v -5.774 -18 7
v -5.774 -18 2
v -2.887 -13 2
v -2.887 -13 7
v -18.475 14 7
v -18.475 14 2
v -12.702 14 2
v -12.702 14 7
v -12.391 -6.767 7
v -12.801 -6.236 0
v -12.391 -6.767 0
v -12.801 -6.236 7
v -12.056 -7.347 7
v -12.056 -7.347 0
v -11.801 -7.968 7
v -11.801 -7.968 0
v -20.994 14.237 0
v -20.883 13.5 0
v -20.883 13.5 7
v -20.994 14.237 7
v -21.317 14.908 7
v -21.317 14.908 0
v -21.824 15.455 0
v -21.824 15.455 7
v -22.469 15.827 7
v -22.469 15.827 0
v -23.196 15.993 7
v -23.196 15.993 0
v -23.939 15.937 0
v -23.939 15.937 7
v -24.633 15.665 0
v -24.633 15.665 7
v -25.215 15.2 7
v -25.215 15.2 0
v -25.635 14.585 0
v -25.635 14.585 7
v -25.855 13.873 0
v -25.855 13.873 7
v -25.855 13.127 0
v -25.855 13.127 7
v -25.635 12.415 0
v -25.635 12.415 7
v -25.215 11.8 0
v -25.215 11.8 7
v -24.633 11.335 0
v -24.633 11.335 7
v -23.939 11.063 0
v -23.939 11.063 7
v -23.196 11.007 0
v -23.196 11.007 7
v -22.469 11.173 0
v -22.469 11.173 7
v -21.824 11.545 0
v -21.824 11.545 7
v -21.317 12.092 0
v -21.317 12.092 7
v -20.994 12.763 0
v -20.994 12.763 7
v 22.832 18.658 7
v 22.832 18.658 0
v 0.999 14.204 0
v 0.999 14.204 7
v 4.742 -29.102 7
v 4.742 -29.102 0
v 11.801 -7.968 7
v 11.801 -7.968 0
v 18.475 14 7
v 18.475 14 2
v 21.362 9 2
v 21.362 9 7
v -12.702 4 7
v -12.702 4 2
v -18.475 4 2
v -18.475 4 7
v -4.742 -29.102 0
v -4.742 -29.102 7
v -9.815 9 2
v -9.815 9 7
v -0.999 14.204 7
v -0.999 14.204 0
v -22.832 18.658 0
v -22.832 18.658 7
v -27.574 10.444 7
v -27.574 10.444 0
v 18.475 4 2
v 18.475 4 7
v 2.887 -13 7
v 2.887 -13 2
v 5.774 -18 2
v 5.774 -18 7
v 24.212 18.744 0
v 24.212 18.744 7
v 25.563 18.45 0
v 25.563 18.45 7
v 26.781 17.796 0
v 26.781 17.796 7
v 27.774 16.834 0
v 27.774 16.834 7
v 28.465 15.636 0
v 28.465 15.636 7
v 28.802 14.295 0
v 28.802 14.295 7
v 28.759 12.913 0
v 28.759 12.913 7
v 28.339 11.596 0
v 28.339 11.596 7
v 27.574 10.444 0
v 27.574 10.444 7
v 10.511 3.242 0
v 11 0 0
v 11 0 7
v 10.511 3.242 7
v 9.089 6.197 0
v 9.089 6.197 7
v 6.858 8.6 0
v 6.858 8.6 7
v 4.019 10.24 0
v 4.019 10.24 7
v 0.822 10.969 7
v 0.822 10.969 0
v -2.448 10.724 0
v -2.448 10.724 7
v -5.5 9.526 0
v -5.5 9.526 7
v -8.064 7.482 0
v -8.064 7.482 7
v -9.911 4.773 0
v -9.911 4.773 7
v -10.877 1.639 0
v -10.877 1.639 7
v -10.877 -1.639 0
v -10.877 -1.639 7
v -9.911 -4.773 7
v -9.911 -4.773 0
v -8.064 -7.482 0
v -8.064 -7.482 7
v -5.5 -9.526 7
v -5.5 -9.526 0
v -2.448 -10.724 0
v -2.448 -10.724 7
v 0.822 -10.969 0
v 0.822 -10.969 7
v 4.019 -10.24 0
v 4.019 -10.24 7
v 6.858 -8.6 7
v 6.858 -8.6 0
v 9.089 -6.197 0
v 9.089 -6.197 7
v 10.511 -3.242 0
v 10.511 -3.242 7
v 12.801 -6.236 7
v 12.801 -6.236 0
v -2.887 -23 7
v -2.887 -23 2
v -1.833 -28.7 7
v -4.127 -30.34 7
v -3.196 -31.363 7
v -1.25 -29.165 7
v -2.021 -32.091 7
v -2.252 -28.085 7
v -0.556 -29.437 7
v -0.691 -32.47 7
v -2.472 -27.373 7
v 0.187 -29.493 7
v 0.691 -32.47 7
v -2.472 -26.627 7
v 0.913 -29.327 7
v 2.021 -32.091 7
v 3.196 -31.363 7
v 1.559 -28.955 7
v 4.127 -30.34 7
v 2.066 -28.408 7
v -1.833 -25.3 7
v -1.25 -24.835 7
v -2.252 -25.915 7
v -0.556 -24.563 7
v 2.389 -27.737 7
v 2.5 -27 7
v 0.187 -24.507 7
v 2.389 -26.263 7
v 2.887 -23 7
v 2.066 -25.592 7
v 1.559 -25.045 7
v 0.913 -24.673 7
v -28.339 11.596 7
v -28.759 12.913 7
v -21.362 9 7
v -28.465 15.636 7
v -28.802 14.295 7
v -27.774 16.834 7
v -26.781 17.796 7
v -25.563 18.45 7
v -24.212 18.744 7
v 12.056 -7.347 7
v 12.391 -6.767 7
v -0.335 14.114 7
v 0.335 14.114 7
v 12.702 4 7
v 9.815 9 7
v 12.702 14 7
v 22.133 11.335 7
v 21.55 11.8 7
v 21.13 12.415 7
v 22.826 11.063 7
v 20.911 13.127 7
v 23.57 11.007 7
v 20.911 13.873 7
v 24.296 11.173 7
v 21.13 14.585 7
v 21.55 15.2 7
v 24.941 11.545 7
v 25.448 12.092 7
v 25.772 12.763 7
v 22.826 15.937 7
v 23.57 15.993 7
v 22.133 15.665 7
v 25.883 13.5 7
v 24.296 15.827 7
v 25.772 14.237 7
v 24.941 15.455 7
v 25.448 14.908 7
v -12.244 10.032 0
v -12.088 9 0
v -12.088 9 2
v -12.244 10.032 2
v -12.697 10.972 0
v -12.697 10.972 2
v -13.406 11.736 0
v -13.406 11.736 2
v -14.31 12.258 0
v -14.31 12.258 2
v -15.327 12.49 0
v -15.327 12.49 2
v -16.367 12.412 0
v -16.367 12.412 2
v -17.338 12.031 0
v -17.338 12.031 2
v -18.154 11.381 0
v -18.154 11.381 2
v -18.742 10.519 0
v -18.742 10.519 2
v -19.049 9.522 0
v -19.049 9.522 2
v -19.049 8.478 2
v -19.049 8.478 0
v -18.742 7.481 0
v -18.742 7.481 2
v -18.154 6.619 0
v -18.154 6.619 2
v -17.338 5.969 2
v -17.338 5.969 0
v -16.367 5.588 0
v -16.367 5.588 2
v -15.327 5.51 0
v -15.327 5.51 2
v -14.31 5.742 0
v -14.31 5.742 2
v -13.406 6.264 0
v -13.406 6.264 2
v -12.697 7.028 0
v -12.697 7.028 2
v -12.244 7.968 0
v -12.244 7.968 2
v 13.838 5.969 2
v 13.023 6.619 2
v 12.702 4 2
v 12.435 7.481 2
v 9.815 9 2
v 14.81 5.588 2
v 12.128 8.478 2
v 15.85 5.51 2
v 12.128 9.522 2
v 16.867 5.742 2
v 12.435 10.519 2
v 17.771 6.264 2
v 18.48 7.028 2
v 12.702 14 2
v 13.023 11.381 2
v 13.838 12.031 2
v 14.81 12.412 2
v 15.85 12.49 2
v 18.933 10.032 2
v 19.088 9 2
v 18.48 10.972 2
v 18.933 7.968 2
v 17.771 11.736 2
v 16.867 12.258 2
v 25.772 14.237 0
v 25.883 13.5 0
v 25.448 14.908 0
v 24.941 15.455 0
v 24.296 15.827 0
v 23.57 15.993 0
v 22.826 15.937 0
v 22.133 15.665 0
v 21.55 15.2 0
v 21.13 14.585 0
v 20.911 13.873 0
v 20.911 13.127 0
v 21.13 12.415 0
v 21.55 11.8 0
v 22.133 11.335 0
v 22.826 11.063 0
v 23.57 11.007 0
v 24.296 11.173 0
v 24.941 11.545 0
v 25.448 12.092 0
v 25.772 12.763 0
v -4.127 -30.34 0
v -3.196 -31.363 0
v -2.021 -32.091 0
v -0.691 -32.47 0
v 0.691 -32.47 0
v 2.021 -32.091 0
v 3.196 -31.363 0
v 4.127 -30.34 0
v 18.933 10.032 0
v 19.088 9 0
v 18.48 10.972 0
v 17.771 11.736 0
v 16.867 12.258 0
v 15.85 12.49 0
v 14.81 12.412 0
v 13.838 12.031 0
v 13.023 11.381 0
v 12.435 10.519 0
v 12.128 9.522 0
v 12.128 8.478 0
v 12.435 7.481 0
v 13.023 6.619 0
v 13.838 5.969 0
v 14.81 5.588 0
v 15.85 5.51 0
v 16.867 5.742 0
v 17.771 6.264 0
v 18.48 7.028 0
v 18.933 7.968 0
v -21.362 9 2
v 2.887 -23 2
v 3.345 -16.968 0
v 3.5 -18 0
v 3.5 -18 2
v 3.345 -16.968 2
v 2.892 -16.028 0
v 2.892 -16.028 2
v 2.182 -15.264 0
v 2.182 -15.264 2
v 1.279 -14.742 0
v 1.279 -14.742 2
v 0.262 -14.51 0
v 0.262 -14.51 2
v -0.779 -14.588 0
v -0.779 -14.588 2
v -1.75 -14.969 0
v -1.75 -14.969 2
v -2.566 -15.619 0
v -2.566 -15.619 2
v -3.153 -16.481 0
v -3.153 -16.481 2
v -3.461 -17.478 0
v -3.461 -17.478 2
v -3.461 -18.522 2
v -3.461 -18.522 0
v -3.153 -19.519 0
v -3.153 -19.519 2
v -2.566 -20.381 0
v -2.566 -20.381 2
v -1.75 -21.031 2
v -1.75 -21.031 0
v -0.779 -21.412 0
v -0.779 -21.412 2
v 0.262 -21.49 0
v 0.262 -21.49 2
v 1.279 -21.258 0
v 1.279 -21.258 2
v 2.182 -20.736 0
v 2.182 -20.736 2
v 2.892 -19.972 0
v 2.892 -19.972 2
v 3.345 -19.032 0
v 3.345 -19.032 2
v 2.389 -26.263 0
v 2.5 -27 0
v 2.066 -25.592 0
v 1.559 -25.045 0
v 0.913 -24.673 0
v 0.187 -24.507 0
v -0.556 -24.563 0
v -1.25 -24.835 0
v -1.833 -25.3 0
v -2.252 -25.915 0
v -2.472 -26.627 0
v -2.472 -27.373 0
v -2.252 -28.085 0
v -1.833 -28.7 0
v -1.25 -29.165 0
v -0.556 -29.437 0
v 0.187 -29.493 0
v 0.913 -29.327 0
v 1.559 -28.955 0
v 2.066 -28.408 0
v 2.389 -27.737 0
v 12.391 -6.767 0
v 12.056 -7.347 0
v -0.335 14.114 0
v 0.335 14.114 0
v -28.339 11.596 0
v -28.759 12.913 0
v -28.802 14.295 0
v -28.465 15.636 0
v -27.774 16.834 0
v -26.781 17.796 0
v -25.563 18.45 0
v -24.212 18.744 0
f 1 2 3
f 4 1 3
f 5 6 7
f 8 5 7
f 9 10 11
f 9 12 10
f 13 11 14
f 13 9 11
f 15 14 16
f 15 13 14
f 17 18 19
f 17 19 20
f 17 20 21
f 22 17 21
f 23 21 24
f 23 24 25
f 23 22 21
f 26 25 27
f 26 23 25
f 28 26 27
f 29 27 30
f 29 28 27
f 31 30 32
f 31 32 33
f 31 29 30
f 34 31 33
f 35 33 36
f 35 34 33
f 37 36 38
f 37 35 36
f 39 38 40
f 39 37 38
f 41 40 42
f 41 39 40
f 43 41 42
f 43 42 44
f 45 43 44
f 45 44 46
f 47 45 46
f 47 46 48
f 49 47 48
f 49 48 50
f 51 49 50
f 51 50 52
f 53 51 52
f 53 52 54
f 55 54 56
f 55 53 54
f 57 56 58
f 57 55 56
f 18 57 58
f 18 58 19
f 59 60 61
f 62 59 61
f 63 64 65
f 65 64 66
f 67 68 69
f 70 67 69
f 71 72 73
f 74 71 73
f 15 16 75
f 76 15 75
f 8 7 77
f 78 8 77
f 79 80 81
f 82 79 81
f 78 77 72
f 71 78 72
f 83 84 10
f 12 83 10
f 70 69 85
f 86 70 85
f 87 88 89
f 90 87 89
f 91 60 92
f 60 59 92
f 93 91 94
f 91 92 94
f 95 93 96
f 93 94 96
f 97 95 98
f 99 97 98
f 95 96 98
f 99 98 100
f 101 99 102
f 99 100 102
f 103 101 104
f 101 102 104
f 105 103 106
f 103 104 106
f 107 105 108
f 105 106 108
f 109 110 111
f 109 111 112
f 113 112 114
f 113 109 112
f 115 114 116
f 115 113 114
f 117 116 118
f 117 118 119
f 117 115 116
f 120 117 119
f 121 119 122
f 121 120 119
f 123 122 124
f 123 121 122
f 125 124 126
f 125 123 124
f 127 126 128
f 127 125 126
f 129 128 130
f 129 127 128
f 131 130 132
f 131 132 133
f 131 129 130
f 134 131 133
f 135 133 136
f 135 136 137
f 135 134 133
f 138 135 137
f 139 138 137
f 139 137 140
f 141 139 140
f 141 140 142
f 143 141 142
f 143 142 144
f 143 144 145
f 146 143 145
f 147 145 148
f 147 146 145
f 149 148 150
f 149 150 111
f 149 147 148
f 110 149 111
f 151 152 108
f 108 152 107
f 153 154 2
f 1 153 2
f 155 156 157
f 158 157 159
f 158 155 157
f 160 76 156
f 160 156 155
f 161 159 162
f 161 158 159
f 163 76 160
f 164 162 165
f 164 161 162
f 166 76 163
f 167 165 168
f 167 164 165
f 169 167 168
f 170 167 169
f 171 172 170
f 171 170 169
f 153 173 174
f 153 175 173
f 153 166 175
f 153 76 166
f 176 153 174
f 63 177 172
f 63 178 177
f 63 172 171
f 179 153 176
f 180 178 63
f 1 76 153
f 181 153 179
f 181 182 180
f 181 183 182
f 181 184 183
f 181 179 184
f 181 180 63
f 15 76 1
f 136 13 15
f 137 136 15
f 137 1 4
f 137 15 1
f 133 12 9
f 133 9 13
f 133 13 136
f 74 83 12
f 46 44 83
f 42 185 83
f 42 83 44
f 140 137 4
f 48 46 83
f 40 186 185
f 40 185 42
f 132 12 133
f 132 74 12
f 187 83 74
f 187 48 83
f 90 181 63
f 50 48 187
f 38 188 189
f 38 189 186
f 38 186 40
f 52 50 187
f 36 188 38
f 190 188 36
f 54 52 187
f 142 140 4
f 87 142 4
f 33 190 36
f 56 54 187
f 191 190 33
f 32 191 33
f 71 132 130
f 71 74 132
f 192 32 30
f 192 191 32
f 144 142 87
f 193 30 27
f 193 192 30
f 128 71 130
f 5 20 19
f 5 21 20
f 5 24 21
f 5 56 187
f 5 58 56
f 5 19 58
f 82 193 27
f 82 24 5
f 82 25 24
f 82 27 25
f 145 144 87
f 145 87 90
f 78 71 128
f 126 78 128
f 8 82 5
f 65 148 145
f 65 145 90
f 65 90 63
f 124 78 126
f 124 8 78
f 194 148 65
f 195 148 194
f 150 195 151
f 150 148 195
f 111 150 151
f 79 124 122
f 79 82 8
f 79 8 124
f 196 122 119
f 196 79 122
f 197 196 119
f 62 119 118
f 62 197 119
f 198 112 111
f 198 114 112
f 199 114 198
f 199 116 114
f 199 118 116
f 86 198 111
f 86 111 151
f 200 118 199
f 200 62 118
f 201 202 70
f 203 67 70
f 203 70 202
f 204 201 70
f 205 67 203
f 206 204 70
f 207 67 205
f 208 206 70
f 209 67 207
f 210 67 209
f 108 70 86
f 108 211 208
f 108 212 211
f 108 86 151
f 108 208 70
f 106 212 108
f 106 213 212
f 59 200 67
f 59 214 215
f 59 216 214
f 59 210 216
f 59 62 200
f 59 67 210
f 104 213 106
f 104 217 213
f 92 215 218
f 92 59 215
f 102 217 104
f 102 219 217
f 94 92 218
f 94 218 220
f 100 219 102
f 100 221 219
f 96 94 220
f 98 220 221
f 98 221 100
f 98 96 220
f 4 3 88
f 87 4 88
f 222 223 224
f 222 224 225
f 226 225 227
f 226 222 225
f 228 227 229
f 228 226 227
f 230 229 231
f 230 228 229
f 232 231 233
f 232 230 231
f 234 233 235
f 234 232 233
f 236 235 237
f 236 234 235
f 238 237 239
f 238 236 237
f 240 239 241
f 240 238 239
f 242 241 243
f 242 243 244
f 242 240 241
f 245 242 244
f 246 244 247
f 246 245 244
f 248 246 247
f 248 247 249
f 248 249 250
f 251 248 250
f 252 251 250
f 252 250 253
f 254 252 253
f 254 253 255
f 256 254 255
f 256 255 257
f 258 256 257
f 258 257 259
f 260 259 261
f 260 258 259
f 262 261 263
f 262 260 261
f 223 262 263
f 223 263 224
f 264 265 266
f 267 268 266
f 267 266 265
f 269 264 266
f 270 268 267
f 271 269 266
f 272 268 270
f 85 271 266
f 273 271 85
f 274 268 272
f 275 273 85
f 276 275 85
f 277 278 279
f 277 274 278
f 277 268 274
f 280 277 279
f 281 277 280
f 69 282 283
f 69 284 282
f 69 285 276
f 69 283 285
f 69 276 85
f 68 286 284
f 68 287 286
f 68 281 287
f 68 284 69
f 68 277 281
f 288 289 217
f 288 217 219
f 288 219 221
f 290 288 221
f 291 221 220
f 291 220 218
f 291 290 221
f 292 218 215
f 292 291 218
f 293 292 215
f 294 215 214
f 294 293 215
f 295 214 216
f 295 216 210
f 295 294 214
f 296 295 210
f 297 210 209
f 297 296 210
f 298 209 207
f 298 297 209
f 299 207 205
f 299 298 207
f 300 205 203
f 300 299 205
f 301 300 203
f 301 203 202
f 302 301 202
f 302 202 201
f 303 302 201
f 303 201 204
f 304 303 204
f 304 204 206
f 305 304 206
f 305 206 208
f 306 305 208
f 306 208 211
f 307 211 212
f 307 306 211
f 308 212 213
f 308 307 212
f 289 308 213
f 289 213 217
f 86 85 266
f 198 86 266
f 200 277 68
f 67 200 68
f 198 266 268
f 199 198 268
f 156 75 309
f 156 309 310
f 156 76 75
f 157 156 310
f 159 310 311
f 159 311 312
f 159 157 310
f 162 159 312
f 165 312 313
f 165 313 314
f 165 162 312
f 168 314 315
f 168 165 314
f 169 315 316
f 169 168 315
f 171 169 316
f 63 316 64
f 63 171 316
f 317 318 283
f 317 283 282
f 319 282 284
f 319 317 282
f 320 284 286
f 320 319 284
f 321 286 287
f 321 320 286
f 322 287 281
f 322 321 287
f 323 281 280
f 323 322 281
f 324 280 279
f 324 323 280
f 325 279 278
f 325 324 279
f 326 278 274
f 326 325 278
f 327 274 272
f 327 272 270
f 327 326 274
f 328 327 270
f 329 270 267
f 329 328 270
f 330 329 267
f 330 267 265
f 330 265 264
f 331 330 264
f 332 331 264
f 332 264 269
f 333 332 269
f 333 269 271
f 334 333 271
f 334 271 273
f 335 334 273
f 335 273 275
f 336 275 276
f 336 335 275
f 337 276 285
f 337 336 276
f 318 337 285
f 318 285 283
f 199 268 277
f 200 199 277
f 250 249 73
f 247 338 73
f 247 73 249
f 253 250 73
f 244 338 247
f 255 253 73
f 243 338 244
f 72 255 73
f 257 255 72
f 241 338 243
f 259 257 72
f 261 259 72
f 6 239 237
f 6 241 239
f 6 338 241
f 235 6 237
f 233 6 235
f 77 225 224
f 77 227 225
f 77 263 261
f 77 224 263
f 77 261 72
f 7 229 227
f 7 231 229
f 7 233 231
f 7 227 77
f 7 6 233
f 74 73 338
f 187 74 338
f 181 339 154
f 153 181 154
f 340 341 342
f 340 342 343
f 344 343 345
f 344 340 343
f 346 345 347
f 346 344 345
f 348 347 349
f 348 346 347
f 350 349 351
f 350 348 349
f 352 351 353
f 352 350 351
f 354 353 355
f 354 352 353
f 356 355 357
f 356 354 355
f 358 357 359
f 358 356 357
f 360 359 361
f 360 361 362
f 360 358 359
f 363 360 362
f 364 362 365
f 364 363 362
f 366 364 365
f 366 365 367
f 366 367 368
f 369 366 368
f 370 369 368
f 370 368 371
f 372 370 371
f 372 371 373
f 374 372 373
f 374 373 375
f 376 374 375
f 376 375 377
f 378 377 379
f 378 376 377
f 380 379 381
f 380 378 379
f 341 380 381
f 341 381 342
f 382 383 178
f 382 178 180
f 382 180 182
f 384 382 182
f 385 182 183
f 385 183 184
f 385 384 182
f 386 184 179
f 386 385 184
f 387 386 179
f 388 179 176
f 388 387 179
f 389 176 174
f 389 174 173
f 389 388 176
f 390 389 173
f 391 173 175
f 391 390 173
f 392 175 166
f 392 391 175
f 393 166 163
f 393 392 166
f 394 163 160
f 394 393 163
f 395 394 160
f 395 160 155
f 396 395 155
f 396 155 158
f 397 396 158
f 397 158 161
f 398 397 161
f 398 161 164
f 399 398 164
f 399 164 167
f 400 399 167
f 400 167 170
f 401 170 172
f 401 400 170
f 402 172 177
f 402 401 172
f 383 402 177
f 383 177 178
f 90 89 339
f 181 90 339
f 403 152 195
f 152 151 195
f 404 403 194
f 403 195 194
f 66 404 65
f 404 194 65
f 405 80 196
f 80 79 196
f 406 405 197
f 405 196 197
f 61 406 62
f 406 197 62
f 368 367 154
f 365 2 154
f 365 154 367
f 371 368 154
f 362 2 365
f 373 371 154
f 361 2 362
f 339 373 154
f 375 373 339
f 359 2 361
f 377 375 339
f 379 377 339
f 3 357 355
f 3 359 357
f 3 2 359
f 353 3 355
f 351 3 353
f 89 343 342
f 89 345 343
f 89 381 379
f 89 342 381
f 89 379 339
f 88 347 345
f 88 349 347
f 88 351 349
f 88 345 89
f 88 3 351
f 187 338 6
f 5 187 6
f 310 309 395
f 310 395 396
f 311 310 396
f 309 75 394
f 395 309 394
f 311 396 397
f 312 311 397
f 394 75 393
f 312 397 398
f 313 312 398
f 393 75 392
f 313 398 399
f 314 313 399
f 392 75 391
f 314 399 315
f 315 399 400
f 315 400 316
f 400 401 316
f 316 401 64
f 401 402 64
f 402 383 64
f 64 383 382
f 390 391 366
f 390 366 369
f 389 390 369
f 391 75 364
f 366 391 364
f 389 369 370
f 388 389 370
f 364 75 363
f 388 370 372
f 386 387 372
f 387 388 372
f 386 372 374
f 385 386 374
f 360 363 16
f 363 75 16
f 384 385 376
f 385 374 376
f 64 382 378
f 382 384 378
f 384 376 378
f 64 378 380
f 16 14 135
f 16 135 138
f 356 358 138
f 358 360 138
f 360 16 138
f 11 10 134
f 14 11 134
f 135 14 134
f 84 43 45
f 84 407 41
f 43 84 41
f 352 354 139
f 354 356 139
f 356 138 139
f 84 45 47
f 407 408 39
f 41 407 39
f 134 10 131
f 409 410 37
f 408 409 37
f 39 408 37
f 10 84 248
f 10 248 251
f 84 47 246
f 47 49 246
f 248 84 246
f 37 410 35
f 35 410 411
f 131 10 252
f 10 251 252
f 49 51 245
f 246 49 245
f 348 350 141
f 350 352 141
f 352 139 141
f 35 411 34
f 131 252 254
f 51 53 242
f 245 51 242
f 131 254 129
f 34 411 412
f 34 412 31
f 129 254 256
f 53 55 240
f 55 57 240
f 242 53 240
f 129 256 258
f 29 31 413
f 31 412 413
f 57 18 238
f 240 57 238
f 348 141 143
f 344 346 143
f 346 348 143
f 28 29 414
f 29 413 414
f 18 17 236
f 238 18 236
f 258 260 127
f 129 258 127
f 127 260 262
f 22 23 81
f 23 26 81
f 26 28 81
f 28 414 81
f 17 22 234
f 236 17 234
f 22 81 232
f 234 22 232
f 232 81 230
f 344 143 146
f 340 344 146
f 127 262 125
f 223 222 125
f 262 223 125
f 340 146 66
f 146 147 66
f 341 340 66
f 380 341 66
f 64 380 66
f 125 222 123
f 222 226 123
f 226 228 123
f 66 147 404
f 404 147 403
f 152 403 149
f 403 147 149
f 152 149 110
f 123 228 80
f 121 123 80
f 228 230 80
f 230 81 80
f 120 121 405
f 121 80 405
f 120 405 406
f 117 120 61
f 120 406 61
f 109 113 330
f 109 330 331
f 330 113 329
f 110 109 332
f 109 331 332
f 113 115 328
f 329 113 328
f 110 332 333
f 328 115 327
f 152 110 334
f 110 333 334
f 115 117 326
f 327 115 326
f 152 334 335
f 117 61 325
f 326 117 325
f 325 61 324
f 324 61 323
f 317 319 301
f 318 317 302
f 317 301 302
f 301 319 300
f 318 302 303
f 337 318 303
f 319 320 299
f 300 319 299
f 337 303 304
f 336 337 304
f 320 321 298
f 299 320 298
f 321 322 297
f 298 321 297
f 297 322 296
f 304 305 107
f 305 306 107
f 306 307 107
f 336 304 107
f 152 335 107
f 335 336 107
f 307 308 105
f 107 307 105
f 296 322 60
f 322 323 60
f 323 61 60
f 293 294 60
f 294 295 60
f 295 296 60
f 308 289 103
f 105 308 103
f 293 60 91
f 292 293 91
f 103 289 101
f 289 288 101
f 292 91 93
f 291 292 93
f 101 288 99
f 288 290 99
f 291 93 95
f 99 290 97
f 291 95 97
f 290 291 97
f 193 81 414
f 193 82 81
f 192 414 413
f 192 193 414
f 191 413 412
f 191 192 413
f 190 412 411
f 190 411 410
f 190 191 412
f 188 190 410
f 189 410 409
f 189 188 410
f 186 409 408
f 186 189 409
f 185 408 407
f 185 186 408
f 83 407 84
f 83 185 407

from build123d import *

# Parameters (mm, degrees)
F0_R     = 2.5
F0_R_2   = 11
F1_DEPTH = 7
F0_R_3   = 3.5
F2_DEPTH = 2
F3_R     = 5


# Not quite as in the source:
# - a feature names something its author has since deleted; it is built from what else it names


with BuildPart() as f1:
    # F0 (on Top) → F1 (new body)
    with BuildSketch(Plane.XY):
        Polygon((0, 14), (-37.5, 21.6506350946), (-12.124355653, -7), (0, -43.3012701892), (12.124355653, -7), (37.5, 21.6506350946), align=None)
        with Locations((0, -27)):
            Circle(F0_R, mode=Mode.SUBTRACT)
        Polygon((2.8867513459, -13), (5.7735026919, -18), (2.8867513459, -23), (-2.8867513459, -23), (-5.7735026919, -18), (-2.8867513459, -13), align=None, mode=Mode.SUBTRACT)
        with Locations((-23.3826859022, 13.5)):
            Circle(F0_R, mode=Mode.SUBTRACT)
        Polygon((-12.7017059222, 4), (-18.4752086141, 4), (-21.36195996, 9), (-18.4752086141, 14), (-12.7017059222, 14), (-9.8149545762, 9), align=None, mode=Mode.SUBTRACT)
        Circle(F0_R_2, mode=Mode.SUBTRACT)
        Polygon((21.36195996, 9), (18.4752086141, 4), (12.7017059222, 4), (9.8149545762, 9), (12.7017059222, 14), (18.4752086141, 14), align=None, mode=Mode.SUBTRACT)
        with Locations((23.3826859022, 13.5)):
            Circle(F0_R, mode=Mode.SUBTRACT)
    extrude(amount=F1_DEPTH)

    # F0 (on Top) → F2 (join)
    with BuildSketch(Plane.XY):
        Polygon((-21.36195996, 9), (-18.4752086141, 4), (-12.7017059222, 4), (-9.8149545762, 9), (-12.7017059222, 14), (-18.4752086141, 14), align=None)
        with Locations((-15.5884572681, 9)):
            Circle(F0_R_3, mode=Mode.SUBTRACT)
        Polygon((2.8867513459, -23), (5.7735026919, -18), (2.8867513459, -13), (-2.8867513459, -13), (-5.7735026919, -18), (-2.8867513459, -23), align=None)
        with Locations((0, -18)):
            Circle(F0_R_3, mode=Mode.SUBTRACT)
        Polygon((12.7017059222, 4), (18.4752086141, 4), (21.36195996, 9), (18.4752086141, 14), (12.7017059222, 14), (9.8149545762, 9), align=None)
        with Locations((15.5884572681, 9)):
            Circle(F0_R_3, mode=Mode.SUBTRACT)
    extrude(amount=F2_DEPTH)

    # F3
    f3_edges = [f1.edges().sort_by_distance(p)[0] for p in [
        (37.5, 21.650635, 3.5),
        (-37.5, 21.650635, 3.5),
        (0, -43.30127, 3.5),
        (-12.124356, -7, 3.5),
        (0, 14, 3.5),
        (12.124356, -7, 3.5),
    ]]
    fillet(f3_edges, radius=F3_R)


solid = f1.part
